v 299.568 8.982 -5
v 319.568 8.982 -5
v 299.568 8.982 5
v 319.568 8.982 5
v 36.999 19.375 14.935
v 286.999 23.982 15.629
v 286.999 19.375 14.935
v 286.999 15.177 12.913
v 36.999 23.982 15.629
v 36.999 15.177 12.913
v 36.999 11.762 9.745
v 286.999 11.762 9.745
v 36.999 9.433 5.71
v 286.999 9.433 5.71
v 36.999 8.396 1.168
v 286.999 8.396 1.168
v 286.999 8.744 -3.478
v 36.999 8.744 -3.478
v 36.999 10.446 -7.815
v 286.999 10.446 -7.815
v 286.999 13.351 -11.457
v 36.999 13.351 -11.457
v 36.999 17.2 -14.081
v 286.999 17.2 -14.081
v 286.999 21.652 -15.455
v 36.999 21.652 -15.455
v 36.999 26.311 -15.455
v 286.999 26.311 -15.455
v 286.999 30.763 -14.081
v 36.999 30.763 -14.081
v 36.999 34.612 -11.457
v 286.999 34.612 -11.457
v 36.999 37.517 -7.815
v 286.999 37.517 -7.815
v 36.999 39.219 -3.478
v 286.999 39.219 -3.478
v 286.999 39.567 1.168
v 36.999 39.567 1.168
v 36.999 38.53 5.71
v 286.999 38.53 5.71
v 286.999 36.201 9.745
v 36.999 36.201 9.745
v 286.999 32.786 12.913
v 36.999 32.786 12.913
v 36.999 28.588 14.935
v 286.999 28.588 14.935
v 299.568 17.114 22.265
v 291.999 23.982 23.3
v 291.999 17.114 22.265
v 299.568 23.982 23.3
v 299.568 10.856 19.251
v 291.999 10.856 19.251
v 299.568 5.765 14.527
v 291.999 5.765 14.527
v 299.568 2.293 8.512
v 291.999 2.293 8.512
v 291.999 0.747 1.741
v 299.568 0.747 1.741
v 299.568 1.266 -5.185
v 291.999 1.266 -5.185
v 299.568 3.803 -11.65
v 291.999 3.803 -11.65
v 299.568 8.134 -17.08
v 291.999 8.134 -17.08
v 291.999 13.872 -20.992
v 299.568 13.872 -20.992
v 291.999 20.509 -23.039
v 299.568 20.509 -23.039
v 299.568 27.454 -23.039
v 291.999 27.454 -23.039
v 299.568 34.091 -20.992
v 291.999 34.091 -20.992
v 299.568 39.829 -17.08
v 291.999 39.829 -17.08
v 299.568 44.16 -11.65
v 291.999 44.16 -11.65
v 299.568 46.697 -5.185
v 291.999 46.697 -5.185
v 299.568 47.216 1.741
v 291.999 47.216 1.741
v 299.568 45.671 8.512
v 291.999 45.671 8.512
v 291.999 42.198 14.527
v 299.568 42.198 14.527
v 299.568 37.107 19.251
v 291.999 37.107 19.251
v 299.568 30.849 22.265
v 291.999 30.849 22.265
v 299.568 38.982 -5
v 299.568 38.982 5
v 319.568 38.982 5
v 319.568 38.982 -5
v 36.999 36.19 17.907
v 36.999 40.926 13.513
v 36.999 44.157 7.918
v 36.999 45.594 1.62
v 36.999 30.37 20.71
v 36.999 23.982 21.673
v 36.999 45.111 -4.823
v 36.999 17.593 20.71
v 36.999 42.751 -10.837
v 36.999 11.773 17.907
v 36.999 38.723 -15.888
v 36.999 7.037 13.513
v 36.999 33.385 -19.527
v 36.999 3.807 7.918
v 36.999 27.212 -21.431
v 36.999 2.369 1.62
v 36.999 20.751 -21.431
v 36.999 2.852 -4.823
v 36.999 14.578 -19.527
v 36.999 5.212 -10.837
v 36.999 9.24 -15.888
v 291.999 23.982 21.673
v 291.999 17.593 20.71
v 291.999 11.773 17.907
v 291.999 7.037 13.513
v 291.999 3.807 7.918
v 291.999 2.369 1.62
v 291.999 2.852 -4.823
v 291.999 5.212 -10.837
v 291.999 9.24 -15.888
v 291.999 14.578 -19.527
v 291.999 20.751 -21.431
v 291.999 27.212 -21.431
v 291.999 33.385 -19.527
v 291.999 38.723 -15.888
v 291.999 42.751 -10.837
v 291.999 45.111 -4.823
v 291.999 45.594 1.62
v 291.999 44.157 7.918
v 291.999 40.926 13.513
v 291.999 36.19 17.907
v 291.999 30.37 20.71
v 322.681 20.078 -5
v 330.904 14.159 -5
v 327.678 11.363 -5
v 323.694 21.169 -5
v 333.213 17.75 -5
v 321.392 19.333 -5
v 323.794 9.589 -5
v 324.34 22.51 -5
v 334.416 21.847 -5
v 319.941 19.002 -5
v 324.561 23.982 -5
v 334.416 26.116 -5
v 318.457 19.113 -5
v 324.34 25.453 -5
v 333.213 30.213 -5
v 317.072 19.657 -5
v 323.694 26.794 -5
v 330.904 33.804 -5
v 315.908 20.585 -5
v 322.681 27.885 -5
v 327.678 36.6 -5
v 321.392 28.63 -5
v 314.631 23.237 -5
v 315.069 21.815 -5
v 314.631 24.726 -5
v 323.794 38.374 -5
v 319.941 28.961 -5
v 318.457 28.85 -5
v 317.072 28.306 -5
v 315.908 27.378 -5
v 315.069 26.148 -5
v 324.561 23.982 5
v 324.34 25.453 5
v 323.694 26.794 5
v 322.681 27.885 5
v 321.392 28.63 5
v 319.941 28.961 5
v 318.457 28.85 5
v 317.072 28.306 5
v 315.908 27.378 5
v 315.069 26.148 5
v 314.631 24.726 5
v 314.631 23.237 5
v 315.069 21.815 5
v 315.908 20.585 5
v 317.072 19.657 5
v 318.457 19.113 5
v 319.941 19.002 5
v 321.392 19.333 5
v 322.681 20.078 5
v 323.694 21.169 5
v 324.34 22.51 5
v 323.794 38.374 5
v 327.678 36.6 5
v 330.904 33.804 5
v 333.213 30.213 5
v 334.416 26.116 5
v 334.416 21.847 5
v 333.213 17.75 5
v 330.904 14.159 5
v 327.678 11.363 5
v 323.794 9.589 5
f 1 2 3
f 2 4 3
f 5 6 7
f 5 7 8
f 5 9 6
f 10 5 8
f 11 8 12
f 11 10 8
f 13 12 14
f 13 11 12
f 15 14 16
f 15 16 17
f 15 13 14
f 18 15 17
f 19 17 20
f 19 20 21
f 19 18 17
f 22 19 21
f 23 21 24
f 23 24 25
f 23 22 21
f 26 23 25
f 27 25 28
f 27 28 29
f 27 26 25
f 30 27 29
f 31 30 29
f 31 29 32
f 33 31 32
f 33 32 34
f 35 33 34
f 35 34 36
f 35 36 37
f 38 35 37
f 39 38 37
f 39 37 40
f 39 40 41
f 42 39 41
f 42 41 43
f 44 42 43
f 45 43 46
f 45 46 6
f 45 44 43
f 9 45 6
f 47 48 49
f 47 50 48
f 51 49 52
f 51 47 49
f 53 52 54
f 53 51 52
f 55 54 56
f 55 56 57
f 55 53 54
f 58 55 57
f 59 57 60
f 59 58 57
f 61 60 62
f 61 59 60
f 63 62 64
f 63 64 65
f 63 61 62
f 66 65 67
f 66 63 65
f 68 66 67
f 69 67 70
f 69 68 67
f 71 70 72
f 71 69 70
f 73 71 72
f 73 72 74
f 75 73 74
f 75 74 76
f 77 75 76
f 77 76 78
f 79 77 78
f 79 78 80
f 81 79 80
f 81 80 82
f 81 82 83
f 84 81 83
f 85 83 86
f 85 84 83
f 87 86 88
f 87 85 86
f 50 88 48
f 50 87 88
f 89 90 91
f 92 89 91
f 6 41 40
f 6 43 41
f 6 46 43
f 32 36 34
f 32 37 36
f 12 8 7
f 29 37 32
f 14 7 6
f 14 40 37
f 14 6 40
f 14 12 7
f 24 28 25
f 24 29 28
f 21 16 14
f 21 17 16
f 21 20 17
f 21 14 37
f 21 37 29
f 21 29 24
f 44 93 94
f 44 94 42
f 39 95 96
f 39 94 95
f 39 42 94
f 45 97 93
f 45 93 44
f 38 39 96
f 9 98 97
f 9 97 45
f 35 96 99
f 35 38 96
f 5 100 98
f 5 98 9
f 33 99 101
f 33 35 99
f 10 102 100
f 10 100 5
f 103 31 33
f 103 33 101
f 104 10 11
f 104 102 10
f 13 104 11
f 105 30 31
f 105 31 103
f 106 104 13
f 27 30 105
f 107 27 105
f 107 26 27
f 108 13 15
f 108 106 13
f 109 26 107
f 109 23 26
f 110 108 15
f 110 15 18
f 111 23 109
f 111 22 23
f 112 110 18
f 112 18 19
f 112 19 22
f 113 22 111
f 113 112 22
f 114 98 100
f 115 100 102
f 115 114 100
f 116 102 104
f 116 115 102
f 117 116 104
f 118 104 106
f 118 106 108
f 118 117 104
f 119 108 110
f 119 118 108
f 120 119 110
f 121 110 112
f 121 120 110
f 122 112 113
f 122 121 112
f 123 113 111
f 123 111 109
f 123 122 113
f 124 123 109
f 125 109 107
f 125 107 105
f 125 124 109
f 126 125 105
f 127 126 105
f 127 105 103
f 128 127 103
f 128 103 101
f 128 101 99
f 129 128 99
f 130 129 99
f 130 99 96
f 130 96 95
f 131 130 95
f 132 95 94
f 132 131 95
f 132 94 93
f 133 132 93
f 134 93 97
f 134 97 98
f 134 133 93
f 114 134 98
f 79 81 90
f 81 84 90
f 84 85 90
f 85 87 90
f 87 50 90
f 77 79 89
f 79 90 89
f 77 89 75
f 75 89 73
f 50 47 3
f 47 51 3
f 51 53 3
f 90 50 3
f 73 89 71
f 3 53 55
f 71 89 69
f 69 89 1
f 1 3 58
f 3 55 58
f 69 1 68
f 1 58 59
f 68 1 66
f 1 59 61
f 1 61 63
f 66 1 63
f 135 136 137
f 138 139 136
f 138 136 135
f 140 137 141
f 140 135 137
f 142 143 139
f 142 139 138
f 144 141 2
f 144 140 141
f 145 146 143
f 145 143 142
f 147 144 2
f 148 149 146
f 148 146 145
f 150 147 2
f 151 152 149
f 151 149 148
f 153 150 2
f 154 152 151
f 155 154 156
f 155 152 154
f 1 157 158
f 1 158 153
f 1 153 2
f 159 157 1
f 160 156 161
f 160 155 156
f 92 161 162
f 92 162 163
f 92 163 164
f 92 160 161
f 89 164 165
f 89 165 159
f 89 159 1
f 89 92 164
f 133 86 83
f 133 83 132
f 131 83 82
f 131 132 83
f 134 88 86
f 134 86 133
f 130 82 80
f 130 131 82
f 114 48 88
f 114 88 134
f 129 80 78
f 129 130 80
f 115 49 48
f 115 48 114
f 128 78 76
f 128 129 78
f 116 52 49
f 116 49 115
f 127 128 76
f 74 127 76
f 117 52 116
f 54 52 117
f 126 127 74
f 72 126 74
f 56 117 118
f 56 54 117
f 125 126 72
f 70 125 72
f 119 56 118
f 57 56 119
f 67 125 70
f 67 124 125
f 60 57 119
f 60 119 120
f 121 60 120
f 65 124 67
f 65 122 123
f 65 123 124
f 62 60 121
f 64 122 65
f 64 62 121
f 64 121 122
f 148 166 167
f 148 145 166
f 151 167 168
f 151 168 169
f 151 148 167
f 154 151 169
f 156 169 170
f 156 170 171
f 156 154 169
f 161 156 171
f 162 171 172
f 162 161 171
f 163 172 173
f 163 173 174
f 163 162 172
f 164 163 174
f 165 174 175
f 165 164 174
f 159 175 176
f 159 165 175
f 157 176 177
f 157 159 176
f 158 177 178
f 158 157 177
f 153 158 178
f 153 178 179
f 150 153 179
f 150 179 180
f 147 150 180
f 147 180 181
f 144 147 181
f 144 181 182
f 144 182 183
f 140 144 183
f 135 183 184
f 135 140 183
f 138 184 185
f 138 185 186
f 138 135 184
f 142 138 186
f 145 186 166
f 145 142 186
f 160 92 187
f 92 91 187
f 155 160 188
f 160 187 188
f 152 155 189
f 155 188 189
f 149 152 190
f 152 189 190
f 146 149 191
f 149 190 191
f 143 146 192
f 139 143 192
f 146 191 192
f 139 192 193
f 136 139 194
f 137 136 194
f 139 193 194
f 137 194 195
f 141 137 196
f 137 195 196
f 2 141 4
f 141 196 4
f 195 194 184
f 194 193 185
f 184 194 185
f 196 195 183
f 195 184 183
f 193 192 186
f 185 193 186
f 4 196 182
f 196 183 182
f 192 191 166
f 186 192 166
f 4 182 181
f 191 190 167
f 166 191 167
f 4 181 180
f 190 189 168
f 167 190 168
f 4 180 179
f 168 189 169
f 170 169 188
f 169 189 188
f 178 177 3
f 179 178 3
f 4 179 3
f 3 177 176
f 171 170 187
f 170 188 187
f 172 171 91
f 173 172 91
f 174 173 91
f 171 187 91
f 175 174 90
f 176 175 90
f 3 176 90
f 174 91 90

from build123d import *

# Parameters (mm, degrees)
SKETCH1_R           = 4.993252943
BOSS_EXTRUDE2_DEPTH = 5


with BuildPart() as part:
    # Sketch1 → Boss-Extrude2 (new, symmetric)
    with BuildSketch(Plane.XY):
        with BuildLine():
            Line((299.568188368, 38.981558344), (319.568188368, 38.981558344))
            ThreePointArc((319.568188368, 38.981558344), (334.568188368, 23.981558344), (319.568188368, 8.981558344))
            Line((319.568188368, 8.981558344), (299.568188368, 8.981558344))
            Line((299.568188368, 8.981558344), (299.568188368, 38.981558344))
        make_face()
        with Locations((319.568188368, 23.981558344)):
            Circle(SKETCH1_R, mode=Mode.SUBTRACT)
    extrude(amount=BOSS_EXTRUDE2_DEPTH, both=True)

    # Sketch3 → Revolve3 (revolve)
    with BuildSketch(Plane.XY, mode=Mode.PRIVATE) as revolve3_sk:
        Polygon((291.998587327, 45.654710618), (291.998587327, 47.281219247), (299.568188368, 47.281219247), (299.568188368, 38.981558344), (299.568188368, 23.981558344), (286.998587327, 23.981558344), (286.998587327, 39.61078701), (36.998587327, 39.61078701), (36.998587327, 45.654710618), align=None)
    revolve(revolve3_sk.sketch.rotate(Axis((286.998587327, 23.981558344, 0), (1, 0, 0)), 90), axis=Axis((286.998587327, 23.981558344, 0), (1, 0, 0)))


solid = part.part
